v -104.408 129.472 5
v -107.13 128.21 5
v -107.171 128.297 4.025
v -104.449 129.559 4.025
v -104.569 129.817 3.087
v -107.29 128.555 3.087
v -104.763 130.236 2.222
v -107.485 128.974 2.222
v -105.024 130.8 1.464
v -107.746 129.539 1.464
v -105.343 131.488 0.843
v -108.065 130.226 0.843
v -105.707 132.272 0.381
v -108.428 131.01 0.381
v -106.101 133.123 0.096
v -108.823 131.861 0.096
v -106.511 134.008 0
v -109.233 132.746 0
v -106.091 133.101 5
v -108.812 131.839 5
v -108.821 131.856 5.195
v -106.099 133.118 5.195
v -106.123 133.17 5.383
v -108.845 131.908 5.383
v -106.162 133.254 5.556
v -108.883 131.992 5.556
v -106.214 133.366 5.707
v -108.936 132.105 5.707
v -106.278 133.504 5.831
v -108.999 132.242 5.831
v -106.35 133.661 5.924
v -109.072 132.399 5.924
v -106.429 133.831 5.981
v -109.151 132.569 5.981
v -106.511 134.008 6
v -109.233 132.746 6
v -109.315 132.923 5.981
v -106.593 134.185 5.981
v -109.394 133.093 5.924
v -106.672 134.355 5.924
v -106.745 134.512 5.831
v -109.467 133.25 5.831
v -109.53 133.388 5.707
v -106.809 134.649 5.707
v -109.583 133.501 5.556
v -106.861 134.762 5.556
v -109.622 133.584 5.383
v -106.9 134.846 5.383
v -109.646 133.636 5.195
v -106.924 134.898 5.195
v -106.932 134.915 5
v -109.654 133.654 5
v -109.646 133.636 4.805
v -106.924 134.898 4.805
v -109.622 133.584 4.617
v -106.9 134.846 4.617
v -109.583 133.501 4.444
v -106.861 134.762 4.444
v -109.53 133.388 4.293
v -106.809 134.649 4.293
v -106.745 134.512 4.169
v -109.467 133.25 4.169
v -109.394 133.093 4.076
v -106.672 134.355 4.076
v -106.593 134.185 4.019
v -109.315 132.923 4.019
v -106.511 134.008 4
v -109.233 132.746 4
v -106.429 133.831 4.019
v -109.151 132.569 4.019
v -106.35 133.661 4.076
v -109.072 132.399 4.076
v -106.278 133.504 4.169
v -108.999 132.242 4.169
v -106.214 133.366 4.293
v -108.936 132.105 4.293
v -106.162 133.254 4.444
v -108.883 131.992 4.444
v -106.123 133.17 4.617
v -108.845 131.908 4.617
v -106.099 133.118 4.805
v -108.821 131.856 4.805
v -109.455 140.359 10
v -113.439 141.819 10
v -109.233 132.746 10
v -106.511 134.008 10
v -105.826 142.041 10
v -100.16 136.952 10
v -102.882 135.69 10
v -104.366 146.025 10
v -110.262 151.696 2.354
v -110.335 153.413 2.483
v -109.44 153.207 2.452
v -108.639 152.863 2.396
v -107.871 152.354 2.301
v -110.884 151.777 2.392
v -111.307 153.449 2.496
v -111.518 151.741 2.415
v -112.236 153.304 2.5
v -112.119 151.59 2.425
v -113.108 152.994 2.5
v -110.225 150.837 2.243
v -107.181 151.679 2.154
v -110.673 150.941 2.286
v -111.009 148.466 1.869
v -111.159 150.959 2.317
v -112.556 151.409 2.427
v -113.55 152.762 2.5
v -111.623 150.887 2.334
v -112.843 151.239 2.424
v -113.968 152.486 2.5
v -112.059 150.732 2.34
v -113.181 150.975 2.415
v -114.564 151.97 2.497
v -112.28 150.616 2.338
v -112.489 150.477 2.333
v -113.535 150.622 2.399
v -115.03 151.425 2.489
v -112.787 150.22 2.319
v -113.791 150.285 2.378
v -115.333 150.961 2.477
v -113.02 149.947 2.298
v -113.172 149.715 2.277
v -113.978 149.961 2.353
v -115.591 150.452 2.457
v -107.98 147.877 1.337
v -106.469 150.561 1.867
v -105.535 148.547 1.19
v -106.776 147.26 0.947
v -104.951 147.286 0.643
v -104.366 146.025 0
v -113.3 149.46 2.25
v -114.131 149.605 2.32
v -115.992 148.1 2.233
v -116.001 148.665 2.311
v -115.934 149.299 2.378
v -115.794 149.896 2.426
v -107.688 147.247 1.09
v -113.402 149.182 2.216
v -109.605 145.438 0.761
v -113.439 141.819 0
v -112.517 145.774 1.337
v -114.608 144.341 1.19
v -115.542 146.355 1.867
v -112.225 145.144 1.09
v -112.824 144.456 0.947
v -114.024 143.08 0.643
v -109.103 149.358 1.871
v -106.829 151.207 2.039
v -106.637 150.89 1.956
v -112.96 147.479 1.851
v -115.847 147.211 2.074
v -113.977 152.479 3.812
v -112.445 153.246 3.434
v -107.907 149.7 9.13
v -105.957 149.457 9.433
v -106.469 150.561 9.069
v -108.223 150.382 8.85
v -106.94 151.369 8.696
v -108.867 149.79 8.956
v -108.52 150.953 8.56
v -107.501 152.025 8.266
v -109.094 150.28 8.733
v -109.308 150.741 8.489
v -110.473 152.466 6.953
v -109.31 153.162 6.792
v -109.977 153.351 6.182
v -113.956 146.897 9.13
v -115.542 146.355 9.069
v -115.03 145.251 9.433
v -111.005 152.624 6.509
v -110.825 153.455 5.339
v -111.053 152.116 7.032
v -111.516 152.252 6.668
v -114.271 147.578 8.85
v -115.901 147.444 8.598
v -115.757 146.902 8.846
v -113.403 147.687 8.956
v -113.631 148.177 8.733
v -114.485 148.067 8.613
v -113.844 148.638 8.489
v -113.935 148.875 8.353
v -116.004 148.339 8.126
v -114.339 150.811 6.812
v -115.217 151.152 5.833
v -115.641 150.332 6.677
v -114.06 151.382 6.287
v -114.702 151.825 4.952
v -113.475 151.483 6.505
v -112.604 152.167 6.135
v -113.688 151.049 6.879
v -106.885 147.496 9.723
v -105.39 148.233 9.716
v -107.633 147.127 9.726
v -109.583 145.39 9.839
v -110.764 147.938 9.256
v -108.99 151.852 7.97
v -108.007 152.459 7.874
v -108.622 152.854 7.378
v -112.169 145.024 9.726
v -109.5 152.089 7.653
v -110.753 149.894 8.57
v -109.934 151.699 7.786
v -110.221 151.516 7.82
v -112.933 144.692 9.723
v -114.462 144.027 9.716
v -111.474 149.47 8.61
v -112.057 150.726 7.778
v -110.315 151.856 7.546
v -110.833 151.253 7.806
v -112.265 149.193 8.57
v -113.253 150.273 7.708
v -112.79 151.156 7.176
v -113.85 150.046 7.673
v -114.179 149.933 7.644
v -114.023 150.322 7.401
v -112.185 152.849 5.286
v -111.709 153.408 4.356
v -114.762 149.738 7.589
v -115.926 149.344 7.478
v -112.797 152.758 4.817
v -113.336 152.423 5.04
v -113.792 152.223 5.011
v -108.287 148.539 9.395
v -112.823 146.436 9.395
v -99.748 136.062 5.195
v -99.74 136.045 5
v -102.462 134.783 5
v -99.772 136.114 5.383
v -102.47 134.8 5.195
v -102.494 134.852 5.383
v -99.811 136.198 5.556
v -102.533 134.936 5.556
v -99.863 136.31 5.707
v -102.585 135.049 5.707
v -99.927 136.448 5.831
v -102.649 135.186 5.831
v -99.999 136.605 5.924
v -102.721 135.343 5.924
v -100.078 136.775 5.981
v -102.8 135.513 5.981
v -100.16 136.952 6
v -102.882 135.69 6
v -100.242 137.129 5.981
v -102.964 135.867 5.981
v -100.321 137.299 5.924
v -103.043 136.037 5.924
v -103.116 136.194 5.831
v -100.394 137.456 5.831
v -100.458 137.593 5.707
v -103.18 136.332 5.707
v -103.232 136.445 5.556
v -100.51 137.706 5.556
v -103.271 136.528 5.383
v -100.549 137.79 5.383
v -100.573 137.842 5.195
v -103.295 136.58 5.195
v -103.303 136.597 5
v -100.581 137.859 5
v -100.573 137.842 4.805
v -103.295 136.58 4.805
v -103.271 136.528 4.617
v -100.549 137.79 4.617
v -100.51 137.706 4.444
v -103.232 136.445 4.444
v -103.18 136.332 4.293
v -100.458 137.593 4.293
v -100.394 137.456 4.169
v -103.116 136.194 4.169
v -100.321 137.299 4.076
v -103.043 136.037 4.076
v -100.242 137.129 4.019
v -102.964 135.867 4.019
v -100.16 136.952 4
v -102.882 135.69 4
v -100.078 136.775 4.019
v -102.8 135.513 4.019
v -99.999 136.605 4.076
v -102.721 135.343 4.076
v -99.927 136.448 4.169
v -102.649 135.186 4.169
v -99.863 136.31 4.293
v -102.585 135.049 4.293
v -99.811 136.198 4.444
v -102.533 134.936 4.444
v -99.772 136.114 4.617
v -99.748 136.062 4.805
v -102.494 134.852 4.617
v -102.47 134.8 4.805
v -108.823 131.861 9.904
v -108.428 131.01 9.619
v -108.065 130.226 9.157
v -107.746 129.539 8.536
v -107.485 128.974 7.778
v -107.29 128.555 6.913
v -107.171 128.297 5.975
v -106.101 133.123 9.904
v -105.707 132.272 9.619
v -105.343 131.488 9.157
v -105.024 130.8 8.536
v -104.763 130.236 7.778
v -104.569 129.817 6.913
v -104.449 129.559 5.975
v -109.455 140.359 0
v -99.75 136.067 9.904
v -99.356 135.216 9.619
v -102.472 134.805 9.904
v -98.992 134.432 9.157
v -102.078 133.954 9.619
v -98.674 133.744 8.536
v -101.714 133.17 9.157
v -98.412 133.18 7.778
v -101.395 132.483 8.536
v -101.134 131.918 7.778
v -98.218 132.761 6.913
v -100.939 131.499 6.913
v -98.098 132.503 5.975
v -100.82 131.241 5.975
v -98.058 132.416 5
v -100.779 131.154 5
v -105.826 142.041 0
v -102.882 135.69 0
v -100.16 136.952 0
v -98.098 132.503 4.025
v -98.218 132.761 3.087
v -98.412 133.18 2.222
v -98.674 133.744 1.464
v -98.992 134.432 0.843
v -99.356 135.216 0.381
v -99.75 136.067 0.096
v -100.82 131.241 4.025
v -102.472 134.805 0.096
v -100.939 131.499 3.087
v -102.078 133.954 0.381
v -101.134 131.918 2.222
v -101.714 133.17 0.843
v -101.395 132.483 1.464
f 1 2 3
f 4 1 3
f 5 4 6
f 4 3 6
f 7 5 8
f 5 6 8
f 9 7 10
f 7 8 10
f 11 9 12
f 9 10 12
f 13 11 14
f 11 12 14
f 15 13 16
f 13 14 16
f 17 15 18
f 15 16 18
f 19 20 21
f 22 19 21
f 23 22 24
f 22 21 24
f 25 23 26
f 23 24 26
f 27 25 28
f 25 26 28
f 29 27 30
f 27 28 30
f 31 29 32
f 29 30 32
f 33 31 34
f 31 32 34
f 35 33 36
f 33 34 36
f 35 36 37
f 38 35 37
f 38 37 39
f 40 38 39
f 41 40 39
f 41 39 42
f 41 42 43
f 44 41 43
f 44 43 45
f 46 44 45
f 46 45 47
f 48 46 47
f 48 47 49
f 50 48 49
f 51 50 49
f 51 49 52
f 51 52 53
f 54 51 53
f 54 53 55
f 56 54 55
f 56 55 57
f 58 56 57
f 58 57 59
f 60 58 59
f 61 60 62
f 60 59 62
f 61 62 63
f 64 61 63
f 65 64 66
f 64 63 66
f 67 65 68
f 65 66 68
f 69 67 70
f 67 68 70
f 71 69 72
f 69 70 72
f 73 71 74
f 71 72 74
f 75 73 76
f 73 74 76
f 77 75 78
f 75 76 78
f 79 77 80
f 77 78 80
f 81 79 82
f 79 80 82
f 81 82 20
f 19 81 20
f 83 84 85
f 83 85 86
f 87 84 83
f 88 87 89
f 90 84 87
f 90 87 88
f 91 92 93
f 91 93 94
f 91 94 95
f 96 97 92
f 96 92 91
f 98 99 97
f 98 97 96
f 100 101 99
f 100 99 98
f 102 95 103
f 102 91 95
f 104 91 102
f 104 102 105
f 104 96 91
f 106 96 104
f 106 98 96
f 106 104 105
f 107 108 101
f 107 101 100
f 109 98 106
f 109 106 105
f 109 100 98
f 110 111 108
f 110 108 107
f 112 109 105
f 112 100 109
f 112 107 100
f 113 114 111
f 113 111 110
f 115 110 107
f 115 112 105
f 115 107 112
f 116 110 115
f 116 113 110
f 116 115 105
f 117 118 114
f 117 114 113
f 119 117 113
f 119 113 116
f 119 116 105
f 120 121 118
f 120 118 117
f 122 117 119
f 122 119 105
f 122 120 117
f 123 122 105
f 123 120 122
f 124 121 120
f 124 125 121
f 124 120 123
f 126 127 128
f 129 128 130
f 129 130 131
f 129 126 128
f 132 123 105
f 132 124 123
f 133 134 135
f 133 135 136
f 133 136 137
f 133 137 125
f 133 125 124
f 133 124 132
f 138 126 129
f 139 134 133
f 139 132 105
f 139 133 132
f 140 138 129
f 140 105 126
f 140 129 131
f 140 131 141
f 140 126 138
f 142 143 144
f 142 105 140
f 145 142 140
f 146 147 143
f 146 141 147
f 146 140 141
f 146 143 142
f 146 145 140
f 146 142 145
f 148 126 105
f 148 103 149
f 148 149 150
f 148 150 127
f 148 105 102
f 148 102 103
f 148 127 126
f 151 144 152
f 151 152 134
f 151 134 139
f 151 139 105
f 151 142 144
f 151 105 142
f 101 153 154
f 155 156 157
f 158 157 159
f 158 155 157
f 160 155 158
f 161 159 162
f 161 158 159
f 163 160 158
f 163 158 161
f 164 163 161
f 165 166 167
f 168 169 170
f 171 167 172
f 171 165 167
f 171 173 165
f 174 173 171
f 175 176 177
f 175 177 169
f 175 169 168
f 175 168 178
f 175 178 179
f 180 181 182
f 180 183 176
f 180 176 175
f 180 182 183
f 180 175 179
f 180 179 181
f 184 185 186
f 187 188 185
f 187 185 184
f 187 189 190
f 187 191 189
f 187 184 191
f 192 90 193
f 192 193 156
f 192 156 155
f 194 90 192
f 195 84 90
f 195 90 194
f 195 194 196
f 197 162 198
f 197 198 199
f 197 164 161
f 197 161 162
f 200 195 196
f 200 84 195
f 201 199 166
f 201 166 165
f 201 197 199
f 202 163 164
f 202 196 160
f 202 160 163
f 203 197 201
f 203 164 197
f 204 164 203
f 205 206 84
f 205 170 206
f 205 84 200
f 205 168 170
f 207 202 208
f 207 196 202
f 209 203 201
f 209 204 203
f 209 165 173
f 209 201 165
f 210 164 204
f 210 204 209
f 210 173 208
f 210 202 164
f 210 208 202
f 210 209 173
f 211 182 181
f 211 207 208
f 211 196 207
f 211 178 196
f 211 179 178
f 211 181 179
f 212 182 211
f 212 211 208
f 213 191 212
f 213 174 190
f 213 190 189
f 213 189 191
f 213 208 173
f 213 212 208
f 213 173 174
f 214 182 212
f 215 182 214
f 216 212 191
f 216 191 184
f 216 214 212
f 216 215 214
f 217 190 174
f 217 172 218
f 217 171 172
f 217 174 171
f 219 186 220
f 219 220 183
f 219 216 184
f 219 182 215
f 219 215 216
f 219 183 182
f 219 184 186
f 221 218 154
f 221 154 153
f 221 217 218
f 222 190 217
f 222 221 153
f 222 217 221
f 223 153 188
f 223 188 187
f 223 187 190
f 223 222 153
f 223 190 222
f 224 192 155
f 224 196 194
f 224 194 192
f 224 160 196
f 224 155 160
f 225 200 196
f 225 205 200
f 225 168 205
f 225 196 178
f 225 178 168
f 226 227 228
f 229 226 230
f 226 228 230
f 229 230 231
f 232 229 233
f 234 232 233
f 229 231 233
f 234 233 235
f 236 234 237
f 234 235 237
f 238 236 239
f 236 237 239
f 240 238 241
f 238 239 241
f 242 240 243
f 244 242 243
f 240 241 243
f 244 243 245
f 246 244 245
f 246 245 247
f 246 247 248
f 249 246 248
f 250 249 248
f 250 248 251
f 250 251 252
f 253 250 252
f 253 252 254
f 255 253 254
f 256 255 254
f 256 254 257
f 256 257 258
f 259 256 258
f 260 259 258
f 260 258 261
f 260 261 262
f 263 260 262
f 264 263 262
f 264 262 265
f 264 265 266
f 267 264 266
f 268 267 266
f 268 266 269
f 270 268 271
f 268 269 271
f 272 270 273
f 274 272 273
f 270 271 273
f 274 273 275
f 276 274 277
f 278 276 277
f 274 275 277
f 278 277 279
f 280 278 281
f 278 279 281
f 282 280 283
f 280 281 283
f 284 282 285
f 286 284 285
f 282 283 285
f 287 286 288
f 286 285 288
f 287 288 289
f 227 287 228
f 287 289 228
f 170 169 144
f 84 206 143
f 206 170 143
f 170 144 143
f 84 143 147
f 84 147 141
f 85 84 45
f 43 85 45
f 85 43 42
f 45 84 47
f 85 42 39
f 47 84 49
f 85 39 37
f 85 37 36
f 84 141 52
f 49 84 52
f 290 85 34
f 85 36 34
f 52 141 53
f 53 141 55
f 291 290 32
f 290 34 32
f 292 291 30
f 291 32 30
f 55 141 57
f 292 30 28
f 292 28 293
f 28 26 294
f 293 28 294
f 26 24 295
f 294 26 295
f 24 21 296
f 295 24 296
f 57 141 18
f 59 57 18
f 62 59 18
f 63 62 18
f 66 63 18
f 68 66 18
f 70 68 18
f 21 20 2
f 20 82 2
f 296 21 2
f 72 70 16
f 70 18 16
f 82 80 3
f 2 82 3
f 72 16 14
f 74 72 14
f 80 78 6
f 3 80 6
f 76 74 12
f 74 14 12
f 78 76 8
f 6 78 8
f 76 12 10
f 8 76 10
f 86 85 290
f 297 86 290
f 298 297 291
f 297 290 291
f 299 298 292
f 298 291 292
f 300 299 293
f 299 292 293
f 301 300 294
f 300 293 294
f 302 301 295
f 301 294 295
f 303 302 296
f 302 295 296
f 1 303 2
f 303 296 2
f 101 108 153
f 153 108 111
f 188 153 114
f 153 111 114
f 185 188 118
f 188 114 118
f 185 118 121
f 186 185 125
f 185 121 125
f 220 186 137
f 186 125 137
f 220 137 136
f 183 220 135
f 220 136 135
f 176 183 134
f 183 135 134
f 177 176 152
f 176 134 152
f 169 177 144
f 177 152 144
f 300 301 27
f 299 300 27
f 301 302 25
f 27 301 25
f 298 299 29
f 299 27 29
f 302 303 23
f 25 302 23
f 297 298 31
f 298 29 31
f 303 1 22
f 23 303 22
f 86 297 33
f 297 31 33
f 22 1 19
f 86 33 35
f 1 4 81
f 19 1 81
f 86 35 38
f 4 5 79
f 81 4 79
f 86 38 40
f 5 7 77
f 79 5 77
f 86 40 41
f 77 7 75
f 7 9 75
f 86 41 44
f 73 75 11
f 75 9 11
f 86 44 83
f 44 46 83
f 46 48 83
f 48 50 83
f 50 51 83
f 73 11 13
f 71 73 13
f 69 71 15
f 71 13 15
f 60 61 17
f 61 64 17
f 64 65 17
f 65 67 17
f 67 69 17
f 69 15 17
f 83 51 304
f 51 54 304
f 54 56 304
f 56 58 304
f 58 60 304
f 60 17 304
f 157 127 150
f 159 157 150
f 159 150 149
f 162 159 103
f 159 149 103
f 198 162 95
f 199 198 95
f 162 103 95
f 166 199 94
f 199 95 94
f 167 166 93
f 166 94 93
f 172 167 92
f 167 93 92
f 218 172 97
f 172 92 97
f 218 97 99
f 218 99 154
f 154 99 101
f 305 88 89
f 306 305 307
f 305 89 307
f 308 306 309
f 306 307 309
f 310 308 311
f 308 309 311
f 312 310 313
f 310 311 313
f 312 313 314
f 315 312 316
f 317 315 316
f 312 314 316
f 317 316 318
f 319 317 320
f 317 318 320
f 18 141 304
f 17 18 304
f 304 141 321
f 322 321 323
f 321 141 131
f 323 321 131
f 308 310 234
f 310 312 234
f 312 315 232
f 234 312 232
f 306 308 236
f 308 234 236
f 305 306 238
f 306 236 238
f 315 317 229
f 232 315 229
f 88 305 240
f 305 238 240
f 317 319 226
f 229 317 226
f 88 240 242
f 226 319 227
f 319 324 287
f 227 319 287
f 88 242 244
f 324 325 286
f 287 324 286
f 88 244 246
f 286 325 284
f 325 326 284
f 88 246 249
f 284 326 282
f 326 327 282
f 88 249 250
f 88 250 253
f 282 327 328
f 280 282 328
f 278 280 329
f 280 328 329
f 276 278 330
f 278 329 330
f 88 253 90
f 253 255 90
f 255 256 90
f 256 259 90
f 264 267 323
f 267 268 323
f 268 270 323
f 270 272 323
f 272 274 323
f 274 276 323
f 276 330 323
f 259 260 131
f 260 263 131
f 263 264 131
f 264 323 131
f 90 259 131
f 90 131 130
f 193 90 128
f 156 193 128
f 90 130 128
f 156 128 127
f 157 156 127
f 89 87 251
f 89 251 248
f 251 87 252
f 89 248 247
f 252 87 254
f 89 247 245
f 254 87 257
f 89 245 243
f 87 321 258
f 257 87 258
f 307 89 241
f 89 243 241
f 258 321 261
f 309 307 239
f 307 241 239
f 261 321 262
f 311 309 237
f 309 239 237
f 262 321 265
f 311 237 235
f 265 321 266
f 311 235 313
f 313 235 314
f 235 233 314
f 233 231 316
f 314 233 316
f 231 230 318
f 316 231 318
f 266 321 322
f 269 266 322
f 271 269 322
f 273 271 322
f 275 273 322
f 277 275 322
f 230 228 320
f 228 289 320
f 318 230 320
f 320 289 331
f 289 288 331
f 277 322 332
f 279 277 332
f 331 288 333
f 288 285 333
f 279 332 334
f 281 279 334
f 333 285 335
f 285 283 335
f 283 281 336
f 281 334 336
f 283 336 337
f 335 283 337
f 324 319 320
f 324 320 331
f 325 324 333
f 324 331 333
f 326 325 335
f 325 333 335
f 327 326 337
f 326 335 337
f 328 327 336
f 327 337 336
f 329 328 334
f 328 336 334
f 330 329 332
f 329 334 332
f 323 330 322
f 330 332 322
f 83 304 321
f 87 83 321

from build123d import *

# Parameters (mm, degrees)
BOSS_EXTRU_1_DEPTH      = 10
ESQUISSE2_R             = 1
ENL_V_MAT_EXTRU_1_DEPTH = 10
ENL_V_MAT_EXTRU_3_DEPTH = 20


with BuildPart() as part:
    # Esquisse1 → Boss.-Extru.1 (new body)
    with BuildSketch(Plane.XY):
        Polygon((-108.571776559, 155.097150605), (-117.644392871, 150.891483803), (-107.130225868, 128.209943022), (-104.408440974, 129.471643062), (-109.455241136, 140.358782637), (-105.826194611, 142.041049358), (-100.779394449, 131.153909783), (-98.057609555, 132.415609823), align=None)
    extrude(amount=BOSS_EXTRU_1_DEPTH)

    # Esquisse2 → Enlèv. mat.-Extru.1 (cut)
    with BuildSketch(Plane(origin=(-39.261124148, -18.199734313, 0), x_dir=(0, 0, 1), z_dir=(-0.9072616312569987, -0.4205666801458358, 0))):
        with BuildLine():
            Line((2.5, 186.375365486), (0, 186.375365486))
            Line((0, 186.375365486), (0, 176.375365486))
            add(Edge.make_bspline(
                [(2.5, 186.375365486), (2.488696379, 181.391976925), (0, 176.375365486)],
                knots=[0, 0, 0, 1, 1, 1], degree=2))
        make_face()
        with BuildLine():
            Line((10, 186.375365486), (2.5, 186.375365486))
            add(Edge.make_bspline(
                [(10, 176.375365486), (9.306148512, 186.375365486), (2.5, 186.375365486)],
                knots=[0, 0, 0, 1, 1, 1], degree=2))
            Line((10, 176.375365486), (10, 186.375365486))
        make_face()
        with BuildLine():
            ThreePointArc((5, 161.375365486), (1.464466094, 162.83983158), (0, 166.375365486))
            Line((0, 166.375365486), (0, 161.375365486))
            Line((0, 161.375365486), (5, 161.375365486))
        make_face()
        with BuildLine():
            Line((10, 161.375365486), (10, 166.375365486))
            ThreePointArc((10, 166.375365486), (8.535533906, 162.83983158), (5, 161.375365486))
            Line((5, 161.375365486), (10, 161.375365486))
        make_face()
        with Locations(Location((5, 166.375365486, 0), (0, 0, 270))):
            Circle(ESQUISSE2_R)
    extrude(amount=-ENL_V_MAT_EXTRU_1_DEPTH, mode=Mode.SUBTRACT)

    # Esquisse4 → Enlèv. mat.-Extru.3 (cut)
    with BuildSketch(Plane(origin=(0, 0, 0), x_dir=(-1, 0, 0), z_dir=(0, 0, -1))):
        with BuildLine():
            Line((113.108084486, 152.99431731), (108.571776559, 155.097150605))
            Line((108.571776559, 155.097150605), (106.468943158, 150.560842448))
            ThreePointArc((106.468943158, 150.560842448), (109.284524694, 153.15259102), (113.108084486, 152.99431731))
        make_face()
        with BuildLine():
            Line((117.644392871, 150.891483803), (113.108084486, 152.99431731))
            ThreePointArc((113.108084486, 152.99431731), (115.699833287, 150.178735668), (115.541559471, 146.355175647))
            Line((115.541559471, 146.355175647), (117.644392871, 150.891483803))
        make_face()
    extrude(amount=-ENL_V_MAT_EXTRU_3_DEPTH, mode=Mode.SUBTRACT)


solid = part.part
